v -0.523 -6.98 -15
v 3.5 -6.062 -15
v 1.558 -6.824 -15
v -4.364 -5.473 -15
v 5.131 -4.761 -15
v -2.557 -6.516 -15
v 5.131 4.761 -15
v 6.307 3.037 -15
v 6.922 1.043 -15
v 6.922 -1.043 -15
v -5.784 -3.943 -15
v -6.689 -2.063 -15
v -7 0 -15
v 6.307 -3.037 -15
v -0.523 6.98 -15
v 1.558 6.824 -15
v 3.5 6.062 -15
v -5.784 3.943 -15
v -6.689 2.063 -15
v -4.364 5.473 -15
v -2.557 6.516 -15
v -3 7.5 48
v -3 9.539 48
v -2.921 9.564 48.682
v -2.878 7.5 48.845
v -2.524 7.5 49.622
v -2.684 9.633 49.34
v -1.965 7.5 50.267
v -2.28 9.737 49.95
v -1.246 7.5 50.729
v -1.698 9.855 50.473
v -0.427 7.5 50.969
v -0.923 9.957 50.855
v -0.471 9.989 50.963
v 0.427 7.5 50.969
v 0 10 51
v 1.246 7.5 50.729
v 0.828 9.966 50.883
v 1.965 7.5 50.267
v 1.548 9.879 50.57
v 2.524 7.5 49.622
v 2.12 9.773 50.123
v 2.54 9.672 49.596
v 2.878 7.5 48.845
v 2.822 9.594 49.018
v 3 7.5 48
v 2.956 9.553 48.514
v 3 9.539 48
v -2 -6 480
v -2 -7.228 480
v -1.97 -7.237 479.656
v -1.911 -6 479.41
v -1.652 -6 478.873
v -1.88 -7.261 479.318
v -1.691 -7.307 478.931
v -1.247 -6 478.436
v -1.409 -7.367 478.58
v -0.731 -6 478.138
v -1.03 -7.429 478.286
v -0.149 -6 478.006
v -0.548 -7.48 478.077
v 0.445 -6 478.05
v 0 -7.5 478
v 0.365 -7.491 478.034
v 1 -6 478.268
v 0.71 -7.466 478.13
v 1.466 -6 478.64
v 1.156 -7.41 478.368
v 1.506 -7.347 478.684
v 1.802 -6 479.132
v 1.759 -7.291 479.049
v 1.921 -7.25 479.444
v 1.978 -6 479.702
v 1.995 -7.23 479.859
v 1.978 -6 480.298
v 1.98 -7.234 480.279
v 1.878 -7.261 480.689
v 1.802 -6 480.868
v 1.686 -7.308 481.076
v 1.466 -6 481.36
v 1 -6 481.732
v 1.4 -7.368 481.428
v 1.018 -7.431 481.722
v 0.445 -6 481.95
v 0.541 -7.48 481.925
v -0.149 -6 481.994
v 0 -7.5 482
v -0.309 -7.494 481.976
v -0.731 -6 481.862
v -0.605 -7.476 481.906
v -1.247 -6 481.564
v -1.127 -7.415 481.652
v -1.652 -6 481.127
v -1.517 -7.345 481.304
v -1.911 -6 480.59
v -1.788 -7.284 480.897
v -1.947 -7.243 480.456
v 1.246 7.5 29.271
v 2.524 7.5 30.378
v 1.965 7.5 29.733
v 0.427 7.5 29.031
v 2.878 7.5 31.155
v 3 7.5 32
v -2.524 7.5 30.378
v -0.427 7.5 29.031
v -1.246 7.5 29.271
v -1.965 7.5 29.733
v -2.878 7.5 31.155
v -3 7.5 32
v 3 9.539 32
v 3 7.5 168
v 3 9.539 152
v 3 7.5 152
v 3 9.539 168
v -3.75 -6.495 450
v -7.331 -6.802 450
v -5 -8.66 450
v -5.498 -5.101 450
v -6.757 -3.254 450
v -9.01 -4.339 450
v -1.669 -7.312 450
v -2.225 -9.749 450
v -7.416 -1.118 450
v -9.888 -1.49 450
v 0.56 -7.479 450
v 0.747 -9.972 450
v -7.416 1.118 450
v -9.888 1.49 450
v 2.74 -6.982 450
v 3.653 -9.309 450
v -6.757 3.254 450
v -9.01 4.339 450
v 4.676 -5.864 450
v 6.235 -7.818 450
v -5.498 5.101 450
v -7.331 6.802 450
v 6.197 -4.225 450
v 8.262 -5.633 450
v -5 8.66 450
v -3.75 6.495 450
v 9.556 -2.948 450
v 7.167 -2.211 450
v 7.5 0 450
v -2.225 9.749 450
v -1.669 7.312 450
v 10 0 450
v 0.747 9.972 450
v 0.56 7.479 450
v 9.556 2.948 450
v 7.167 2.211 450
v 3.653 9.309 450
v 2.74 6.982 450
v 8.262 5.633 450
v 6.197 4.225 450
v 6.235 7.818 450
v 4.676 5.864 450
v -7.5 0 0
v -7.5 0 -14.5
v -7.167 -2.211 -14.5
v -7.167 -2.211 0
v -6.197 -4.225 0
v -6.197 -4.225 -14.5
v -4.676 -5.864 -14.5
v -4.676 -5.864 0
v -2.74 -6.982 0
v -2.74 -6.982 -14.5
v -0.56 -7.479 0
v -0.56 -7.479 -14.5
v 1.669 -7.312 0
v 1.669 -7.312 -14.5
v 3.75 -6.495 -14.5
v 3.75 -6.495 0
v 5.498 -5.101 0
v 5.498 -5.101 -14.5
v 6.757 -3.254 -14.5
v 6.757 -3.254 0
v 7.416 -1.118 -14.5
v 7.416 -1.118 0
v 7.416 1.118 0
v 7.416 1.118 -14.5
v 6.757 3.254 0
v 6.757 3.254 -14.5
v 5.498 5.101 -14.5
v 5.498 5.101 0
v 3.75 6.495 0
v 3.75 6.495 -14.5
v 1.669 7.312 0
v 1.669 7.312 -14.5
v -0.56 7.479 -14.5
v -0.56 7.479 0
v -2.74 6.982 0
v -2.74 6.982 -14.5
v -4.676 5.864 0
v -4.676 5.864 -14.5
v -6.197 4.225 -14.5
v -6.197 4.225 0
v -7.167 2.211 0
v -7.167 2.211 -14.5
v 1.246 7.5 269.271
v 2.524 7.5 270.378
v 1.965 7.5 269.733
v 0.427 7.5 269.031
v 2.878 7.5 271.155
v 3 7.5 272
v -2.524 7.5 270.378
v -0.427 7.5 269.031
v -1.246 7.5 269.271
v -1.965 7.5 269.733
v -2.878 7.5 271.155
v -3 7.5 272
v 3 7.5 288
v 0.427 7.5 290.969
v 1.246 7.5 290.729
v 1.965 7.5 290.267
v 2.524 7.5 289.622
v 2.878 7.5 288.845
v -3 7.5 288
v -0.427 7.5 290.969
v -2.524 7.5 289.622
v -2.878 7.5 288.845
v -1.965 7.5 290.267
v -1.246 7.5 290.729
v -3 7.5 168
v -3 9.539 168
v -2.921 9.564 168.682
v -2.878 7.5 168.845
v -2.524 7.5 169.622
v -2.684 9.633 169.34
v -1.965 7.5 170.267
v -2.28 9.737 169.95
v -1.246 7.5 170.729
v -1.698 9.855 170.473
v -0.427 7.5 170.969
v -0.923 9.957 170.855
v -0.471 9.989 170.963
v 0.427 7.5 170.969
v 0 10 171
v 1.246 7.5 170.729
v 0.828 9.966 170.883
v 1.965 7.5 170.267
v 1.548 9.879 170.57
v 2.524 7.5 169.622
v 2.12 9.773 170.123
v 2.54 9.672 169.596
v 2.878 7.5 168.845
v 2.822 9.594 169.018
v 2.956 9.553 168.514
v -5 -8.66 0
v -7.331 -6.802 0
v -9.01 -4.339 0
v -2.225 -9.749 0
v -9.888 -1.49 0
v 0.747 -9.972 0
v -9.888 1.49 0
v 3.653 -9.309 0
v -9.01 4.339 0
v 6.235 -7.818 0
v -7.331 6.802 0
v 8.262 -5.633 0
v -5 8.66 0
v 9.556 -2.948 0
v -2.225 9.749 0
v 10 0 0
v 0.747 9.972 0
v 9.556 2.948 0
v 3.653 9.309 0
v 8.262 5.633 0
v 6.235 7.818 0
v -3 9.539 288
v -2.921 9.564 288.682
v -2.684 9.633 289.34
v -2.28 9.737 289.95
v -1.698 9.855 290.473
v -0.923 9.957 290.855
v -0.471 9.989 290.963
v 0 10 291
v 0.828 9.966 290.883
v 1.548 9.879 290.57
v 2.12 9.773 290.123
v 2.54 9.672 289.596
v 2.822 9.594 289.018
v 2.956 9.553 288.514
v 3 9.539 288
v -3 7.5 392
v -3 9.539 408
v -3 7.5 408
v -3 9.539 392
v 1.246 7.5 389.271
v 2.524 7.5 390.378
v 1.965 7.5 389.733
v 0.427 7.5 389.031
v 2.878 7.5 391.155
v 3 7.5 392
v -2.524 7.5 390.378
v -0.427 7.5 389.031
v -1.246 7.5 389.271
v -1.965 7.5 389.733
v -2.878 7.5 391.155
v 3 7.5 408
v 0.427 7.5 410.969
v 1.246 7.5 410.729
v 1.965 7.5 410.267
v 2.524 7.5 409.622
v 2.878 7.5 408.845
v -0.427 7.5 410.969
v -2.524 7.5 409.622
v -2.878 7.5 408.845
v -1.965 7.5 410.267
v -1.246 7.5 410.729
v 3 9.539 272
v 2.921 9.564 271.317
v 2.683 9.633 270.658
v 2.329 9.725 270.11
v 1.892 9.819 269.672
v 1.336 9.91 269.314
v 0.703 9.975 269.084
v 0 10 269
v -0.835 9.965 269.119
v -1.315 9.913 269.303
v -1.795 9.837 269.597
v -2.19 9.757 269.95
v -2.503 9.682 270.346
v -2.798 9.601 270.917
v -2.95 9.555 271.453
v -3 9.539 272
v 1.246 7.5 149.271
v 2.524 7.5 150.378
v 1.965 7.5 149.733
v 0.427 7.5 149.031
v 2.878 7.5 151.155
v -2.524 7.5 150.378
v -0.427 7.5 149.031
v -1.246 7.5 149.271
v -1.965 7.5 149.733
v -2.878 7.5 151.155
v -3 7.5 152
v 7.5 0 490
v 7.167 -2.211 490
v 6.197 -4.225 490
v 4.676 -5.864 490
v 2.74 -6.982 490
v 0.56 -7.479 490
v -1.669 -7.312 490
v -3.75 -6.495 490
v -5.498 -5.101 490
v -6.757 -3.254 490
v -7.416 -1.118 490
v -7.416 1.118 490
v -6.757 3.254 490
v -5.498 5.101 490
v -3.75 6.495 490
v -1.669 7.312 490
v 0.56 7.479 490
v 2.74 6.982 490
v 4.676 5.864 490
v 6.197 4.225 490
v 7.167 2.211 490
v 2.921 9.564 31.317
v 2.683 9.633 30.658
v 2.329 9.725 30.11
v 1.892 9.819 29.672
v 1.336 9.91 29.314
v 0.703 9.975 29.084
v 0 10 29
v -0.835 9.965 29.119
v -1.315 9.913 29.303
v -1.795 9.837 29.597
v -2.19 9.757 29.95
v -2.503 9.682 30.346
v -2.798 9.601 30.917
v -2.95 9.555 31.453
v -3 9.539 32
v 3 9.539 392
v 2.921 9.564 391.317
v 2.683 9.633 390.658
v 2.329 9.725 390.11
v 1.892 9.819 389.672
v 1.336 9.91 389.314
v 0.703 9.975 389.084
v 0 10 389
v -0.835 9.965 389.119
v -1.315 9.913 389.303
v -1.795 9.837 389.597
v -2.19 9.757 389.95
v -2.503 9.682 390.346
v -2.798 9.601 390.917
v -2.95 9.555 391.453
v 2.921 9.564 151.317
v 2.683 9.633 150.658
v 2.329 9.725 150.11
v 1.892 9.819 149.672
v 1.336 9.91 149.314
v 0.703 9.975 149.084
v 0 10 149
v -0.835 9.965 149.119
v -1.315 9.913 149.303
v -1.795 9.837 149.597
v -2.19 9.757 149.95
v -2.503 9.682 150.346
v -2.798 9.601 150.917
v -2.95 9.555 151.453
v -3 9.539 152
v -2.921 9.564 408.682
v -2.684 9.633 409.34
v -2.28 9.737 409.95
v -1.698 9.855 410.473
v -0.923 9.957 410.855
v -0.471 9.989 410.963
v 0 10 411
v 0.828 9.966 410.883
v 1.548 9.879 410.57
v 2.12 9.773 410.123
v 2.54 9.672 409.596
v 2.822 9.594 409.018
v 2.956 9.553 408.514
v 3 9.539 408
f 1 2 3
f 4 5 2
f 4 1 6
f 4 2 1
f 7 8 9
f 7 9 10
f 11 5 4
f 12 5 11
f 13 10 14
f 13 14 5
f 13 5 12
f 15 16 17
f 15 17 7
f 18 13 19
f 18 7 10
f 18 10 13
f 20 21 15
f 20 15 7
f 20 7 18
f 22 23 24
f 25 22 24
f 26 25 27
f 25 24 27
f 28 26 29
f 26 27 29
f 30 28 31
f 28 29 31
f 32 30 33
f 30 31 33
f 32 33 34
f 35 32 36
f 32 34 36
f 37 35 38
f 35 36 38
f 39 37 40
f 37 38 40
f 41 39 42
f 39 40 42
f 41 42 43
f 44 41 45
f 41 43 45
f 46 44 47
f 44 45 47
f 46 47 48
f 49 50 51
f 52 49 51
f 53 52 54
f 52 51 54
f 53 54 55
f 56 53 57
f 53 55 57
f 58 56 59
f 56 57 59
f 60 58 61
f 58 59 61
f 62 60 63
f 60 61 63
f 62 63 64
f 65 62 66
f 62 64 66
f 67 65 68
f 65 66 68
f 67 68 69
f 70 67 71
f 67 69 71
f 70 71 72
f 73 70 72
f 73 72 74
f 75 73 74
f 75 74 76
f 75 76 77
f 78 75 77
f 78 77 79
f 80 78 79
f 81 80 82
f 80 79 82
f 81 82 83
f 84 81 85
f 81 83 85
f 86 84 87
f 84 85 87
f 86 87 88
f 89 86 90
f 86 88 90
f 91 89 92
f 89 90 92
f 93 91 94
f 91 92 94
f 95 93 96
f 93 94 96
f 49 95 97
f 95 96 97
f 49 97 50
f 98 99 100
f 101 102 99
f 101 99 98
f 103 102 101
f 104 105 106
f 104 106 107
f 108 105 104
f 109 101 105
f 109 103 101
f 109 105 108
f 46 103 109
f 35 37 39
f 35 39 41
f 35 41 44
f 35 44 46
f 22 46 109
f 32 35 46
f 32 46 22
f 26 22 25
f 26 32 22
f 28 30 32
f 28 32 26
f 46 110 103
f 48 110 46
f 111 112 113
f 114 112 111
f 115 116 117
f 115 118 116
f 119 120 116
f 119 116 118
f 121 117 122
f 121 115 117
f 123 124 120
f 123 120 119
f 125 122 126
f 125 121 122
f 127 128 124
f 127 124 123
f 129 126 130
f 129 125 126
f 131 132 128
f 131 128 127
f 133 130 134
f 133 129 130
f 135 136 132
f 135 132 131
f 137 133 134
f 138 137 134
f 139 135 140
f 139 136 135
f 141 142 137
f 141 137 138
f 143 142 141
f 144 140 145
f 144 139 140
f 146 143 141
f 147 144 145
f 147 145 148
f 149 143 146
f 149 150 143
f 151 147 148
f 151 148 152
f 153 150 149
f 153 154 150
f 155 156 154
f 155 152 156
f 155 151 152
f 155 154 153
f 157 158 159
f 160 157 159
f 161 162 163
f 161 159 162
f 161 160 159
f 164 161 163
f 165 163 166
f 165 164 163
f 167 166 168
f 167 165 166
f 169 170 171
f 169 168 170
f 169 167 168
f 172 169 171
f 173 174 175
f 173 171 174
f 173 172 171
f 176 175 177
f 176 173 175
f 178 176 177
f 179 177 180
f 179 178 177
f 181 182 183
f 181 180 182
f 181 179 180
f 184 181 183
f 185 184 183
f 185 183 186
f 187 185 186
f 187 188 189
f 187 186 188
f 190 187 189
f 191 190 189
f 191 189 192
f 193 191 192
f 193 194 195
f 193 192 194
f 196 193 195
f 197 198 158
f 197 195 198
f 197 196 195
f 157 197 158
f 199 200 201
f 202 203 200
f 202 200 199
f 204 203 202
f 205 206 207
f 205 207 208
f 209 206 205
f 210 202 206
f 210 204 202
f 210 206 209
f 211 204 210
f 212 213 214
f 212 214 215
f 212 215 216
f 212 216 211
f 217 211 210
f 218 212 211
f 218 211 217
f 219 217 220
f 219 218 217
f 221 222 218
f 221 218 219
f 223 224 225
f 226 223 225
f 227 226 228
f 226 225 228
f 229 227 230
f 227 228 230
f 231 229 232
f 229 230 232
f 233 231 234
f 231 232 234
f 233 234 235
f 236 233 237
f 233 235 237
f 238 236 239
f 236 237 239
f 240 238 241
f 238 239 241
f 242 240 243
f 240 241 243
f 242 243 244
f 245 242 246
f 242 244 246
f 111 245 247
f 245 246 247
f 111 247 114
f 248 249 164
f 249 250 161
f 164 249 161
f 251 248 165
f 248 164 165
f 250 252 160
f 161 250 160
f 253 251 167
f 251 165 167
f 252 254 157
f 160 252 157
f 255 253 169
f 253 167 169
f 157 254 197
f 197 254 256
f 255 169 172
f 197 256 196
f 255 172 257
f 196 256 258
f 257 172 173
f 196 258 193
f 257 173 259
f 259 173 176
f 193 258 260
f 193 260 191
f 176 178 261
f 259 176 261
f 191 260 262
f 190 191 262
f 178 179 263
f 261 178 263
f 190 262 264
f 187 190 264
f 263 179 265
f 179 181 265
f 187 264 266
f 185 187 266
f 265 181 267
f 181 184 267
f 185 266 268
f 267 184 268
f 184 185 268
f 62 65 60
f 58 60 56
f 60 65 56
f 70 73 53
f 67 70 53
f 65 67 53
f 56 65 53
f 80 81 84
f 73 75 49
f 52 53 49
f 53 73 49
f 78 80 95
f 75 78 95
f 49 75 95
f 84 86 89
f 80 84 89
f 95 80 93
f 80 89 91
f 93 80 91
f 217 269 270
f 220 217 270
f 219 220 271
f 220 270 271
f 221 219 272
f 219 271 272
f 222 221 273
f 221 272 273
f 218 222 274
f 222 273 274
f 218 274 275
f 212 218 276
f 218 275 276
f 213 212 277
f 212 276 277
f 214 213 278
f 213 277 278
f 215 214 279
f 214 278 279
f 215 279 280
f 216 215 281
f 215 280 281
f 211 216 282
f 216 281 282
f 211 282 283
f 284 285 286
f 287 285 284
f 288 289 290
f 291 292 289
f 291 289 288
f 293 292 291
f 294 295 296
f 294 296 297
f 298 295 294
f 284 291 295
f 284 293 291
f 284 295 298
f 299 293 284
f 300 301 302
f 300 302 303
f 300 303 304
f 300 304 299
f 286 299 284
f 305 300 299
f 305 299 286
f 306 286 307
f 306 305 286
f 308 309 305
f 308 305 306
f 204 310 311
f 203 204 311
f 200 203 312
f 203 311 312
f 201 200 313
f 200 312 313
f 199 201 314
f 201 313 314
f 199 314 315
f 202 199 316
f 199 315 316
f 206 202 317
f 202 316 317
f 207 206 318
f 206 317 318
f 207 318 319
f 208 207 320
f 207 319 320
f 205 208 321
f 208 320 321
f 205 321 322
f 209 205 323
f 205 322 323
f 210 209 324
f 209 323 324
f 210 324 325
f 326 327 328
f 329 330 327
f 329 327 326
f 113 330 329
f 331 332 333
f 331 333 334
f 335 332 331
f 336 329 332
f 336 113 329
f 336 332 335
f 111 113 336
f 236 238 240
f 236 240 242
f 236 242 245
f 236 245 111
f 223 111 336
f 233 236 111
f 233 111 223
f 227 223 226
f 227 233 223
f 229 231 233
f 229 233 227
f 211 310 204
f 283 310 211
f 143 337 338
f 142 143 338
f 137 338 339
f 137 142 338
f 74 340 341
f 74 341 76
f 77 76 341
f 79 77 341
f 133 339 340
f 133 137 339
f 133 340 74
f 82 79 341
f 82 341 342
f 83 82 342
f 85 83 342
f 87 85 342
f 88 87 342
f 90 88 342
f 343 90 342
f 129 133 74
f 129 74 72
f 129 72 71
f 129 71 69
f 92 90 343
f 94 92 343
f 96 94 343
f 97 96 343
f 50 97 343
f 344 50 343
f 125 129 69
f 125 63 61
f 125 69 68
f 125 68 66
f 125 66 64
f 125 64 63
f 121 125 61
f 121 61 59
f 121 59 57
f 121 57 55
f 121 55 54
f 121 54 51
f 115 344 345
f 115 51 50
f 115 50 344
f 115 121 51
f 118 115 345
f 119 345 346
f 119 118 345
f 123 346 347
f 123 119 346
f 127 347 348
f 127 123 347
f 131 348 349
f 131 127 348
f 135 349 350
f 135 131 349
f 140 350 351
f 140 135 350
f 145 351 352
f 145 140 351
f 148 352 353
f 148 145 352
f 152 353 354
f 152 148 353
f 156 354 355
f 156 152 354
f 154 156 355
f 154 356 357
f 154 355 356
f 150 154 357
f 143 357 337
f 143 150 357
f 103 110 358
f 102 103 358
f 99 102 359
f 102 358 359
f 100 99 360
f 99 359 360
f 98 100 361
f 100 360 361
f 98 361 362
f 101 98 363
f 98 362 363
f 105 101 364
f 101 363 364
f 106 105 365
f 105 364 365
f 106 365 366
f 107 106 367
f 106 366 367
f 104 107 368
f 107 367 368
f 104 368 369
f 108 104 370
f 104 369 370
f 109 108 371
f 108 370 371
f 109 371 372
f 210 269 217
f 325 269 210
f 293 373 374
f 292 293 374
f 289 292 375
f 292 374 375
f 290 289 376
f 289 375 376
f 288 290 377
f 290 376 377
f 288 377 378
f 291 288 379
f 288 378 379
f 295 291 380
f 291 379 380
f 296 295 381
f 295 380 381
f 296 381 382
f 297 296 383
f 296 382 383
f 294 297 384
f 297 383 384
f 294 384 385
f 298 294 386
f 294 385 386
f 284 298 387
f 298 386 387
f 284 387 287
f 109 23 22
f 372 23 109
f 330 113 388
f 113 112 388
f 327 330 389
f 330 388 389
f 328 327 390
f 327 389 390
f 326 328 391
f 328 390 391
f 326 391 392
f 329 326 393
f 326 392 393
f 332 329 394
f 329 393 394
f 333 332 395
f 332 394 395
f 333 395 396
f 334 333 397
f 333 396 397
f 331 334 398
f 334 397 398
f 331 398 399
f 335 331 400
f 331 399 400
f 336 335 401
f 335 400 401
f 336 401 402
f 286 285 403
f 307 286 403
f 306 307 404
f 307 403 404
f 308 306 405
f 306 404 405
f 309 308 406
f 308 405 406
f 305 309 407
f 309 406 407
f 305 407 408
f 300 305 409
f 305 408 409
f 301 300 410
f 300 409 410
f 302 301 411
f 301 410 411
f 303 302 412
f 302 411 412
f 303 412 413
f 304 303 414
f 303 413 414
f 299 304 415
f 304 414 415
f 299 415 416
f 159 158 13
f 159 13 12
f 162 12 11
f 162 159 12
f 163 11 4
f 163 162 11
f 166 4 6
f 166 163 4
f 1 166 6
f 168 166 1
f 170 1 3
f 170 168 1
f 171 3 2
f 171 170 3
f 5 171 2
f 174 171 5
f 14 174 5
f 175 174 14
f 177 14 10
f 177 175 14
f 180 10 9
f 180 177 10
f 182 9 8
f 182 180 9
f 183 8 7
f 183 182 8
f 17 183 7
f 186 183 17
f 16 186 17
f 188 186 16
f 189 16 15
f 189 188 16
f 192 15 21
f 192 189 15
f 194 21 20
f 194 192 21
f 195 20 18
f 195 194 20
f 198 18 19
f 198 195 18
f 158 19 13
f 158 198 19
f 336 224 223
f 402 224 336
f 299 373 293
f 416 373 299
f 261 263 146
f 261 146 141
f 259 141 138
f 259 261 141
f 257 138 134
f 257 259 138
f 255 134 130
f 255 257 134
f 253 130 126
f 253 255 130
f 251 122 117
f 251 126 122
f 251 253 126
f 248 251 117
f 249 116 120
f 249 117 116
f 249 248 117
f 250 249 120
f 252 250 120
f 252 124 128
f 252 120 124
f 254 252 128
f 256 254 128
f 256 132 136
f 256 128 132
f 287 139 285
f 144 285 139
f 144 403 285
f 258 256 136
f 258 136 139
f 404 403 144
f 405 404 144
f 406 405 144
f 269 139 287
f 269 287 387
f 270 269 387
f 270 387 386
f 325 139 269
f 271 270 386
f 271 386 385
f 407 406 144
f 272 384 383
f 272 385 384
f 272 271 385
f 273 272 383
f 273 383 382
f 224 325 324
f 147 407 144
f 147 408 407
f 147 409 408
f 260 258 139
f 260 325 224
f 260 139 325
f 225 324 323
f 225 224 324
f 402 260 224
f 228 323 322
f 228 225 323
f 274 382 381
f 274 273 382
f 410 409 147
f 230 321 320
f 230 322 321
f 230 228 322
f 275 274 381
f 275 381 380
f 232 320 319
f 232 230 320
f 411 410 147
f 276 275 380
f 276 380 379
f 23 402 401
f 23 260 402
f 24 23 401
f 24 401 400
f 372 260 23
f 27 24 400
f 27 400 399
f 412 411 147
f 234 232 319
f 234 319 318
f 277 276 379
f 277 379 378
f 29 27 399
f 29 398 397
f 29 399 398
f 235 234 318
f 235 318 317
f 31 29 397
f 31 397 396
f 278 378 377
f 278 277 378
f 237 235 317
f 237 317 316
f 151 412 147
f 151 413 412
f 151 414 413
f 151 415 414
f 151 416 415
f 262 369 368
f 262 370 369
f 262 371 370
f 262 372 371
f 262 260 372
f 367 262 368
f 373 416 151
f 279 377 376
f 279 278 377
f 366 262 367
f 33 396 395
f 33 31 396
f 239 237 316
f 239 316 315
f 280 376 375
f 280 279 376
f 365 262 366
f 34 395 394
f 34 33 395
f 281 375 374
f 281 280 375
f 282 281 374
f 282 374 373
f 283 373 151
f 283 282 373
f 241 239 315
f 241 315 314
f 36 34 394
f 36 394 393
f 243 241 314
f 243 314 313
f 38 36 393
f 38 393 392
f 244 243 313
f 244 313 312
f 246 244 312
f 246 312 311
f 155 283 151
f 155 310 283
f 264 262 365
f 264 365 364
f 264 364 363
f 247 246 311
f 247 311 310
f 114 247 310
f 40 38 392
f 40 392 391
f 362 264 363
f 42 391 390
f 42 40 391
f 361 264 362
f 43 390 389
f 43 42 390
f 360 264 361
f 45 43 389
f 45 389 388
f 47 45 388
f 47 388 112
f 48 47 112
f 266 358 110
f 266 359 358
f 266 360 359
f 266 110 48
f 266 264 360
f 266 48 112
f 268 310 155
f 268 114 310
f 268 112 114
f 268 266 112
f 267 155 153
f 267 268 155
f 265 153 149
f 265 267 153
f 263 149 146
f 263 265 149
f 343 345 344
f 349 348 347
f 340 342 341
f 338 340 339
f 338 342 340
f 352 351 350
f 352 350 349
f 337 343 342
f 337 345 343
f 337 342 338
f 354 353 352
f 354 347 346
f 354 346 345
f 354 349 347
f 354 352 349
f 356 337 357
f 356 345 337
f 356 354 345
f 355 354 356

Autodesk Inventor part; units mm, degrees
ref_plane "YZ Plane" through (0, 0, 0) normal (1, 0, 0) x (0, 1, 0)
sketch "草图1" plane through (0, 0, 0) normal (0, 0, 1) x (1, 0, 0)
  circle A0 centre (0, 0) radius 10
  dimension "d0" = 20
extrude "拉伸1" add sketch "草图1" along normal blind 450
sketch "草图2" plane through (0, 0, 450) normal (0, 0, 1) x (1, 0, 0)
  circle A0 centre (0, 0) radius 7.5
  dimension "d3" = 15
extrude "拉伸2" add sketch "草图2" along normal blind 40
sketch "草图3" plane through (0, 0, 0) normal (0, 0, -1) x (-1, 0, 0)
  circle A0 centre (0, 0) radius 7.5
  dimension "d6" = 15
extrude "拉伸3" add sketch "草图3" along normal blind 15
chamfer "倒角1" distance 0.5 angle 45 1 edges at (7.5, 0, -15)
ref_plane "工作平面1" through (0, 10, 0) normal (0, 1, 0) x (-1, 0, 0)
sketch "草图4" plane through (0, 10, 0) normal (0, 1, 0) x (-1, 0, 0)
  line L0 (3, 392) -> (-3, 392)
  line L1 (-3, 392) -> (-3, 408)
  line L2 (-3, 408) -> (3, 408)
  line L3 (3, 408) -> (3, 392)
  arc A0 (-3, 392) -> (3, 392) centre (0, 392) ccw
  arc A1 (3, 408) -> (-3, 408) centre (0, 408) ccw
  line L4 (10, 450) -> (-10, 450) projected
  point P0 (0, 0)
  dimension "d12" = 6
  dimension "d13" = 16
  dimension "d14" = 0
  dimension "d15" = 42
extrude "拉伸4" cut sketch "草图4" against normal blind 2.5
pattern_linear "矩形阵列1" count 4 spacing 120 along (0, 0, -1) of "拉伸4"
ref_plane "工作平面2" through (0, -7.5, 450) normal (0, 1, 0) x (-1, 0, 0)
sketch "草图5" plane through (0, -7.5, 450) normal (0, 1, 0) x (-1, 0, 0)
  circle A0 centre (0, 30) radius 2
  line L0 (7.5, 40) -> (-7.5, 40) projected
  line L1 (0, -450) -> (0, -436.617)
  dimension "d21" = 4
  dimension "d22" = 10
  dimension "d23" = 13.383
extrude "拉伸5" cut sketch "草图5" along normal blind 1.5
properties part number "砂轮轴"
